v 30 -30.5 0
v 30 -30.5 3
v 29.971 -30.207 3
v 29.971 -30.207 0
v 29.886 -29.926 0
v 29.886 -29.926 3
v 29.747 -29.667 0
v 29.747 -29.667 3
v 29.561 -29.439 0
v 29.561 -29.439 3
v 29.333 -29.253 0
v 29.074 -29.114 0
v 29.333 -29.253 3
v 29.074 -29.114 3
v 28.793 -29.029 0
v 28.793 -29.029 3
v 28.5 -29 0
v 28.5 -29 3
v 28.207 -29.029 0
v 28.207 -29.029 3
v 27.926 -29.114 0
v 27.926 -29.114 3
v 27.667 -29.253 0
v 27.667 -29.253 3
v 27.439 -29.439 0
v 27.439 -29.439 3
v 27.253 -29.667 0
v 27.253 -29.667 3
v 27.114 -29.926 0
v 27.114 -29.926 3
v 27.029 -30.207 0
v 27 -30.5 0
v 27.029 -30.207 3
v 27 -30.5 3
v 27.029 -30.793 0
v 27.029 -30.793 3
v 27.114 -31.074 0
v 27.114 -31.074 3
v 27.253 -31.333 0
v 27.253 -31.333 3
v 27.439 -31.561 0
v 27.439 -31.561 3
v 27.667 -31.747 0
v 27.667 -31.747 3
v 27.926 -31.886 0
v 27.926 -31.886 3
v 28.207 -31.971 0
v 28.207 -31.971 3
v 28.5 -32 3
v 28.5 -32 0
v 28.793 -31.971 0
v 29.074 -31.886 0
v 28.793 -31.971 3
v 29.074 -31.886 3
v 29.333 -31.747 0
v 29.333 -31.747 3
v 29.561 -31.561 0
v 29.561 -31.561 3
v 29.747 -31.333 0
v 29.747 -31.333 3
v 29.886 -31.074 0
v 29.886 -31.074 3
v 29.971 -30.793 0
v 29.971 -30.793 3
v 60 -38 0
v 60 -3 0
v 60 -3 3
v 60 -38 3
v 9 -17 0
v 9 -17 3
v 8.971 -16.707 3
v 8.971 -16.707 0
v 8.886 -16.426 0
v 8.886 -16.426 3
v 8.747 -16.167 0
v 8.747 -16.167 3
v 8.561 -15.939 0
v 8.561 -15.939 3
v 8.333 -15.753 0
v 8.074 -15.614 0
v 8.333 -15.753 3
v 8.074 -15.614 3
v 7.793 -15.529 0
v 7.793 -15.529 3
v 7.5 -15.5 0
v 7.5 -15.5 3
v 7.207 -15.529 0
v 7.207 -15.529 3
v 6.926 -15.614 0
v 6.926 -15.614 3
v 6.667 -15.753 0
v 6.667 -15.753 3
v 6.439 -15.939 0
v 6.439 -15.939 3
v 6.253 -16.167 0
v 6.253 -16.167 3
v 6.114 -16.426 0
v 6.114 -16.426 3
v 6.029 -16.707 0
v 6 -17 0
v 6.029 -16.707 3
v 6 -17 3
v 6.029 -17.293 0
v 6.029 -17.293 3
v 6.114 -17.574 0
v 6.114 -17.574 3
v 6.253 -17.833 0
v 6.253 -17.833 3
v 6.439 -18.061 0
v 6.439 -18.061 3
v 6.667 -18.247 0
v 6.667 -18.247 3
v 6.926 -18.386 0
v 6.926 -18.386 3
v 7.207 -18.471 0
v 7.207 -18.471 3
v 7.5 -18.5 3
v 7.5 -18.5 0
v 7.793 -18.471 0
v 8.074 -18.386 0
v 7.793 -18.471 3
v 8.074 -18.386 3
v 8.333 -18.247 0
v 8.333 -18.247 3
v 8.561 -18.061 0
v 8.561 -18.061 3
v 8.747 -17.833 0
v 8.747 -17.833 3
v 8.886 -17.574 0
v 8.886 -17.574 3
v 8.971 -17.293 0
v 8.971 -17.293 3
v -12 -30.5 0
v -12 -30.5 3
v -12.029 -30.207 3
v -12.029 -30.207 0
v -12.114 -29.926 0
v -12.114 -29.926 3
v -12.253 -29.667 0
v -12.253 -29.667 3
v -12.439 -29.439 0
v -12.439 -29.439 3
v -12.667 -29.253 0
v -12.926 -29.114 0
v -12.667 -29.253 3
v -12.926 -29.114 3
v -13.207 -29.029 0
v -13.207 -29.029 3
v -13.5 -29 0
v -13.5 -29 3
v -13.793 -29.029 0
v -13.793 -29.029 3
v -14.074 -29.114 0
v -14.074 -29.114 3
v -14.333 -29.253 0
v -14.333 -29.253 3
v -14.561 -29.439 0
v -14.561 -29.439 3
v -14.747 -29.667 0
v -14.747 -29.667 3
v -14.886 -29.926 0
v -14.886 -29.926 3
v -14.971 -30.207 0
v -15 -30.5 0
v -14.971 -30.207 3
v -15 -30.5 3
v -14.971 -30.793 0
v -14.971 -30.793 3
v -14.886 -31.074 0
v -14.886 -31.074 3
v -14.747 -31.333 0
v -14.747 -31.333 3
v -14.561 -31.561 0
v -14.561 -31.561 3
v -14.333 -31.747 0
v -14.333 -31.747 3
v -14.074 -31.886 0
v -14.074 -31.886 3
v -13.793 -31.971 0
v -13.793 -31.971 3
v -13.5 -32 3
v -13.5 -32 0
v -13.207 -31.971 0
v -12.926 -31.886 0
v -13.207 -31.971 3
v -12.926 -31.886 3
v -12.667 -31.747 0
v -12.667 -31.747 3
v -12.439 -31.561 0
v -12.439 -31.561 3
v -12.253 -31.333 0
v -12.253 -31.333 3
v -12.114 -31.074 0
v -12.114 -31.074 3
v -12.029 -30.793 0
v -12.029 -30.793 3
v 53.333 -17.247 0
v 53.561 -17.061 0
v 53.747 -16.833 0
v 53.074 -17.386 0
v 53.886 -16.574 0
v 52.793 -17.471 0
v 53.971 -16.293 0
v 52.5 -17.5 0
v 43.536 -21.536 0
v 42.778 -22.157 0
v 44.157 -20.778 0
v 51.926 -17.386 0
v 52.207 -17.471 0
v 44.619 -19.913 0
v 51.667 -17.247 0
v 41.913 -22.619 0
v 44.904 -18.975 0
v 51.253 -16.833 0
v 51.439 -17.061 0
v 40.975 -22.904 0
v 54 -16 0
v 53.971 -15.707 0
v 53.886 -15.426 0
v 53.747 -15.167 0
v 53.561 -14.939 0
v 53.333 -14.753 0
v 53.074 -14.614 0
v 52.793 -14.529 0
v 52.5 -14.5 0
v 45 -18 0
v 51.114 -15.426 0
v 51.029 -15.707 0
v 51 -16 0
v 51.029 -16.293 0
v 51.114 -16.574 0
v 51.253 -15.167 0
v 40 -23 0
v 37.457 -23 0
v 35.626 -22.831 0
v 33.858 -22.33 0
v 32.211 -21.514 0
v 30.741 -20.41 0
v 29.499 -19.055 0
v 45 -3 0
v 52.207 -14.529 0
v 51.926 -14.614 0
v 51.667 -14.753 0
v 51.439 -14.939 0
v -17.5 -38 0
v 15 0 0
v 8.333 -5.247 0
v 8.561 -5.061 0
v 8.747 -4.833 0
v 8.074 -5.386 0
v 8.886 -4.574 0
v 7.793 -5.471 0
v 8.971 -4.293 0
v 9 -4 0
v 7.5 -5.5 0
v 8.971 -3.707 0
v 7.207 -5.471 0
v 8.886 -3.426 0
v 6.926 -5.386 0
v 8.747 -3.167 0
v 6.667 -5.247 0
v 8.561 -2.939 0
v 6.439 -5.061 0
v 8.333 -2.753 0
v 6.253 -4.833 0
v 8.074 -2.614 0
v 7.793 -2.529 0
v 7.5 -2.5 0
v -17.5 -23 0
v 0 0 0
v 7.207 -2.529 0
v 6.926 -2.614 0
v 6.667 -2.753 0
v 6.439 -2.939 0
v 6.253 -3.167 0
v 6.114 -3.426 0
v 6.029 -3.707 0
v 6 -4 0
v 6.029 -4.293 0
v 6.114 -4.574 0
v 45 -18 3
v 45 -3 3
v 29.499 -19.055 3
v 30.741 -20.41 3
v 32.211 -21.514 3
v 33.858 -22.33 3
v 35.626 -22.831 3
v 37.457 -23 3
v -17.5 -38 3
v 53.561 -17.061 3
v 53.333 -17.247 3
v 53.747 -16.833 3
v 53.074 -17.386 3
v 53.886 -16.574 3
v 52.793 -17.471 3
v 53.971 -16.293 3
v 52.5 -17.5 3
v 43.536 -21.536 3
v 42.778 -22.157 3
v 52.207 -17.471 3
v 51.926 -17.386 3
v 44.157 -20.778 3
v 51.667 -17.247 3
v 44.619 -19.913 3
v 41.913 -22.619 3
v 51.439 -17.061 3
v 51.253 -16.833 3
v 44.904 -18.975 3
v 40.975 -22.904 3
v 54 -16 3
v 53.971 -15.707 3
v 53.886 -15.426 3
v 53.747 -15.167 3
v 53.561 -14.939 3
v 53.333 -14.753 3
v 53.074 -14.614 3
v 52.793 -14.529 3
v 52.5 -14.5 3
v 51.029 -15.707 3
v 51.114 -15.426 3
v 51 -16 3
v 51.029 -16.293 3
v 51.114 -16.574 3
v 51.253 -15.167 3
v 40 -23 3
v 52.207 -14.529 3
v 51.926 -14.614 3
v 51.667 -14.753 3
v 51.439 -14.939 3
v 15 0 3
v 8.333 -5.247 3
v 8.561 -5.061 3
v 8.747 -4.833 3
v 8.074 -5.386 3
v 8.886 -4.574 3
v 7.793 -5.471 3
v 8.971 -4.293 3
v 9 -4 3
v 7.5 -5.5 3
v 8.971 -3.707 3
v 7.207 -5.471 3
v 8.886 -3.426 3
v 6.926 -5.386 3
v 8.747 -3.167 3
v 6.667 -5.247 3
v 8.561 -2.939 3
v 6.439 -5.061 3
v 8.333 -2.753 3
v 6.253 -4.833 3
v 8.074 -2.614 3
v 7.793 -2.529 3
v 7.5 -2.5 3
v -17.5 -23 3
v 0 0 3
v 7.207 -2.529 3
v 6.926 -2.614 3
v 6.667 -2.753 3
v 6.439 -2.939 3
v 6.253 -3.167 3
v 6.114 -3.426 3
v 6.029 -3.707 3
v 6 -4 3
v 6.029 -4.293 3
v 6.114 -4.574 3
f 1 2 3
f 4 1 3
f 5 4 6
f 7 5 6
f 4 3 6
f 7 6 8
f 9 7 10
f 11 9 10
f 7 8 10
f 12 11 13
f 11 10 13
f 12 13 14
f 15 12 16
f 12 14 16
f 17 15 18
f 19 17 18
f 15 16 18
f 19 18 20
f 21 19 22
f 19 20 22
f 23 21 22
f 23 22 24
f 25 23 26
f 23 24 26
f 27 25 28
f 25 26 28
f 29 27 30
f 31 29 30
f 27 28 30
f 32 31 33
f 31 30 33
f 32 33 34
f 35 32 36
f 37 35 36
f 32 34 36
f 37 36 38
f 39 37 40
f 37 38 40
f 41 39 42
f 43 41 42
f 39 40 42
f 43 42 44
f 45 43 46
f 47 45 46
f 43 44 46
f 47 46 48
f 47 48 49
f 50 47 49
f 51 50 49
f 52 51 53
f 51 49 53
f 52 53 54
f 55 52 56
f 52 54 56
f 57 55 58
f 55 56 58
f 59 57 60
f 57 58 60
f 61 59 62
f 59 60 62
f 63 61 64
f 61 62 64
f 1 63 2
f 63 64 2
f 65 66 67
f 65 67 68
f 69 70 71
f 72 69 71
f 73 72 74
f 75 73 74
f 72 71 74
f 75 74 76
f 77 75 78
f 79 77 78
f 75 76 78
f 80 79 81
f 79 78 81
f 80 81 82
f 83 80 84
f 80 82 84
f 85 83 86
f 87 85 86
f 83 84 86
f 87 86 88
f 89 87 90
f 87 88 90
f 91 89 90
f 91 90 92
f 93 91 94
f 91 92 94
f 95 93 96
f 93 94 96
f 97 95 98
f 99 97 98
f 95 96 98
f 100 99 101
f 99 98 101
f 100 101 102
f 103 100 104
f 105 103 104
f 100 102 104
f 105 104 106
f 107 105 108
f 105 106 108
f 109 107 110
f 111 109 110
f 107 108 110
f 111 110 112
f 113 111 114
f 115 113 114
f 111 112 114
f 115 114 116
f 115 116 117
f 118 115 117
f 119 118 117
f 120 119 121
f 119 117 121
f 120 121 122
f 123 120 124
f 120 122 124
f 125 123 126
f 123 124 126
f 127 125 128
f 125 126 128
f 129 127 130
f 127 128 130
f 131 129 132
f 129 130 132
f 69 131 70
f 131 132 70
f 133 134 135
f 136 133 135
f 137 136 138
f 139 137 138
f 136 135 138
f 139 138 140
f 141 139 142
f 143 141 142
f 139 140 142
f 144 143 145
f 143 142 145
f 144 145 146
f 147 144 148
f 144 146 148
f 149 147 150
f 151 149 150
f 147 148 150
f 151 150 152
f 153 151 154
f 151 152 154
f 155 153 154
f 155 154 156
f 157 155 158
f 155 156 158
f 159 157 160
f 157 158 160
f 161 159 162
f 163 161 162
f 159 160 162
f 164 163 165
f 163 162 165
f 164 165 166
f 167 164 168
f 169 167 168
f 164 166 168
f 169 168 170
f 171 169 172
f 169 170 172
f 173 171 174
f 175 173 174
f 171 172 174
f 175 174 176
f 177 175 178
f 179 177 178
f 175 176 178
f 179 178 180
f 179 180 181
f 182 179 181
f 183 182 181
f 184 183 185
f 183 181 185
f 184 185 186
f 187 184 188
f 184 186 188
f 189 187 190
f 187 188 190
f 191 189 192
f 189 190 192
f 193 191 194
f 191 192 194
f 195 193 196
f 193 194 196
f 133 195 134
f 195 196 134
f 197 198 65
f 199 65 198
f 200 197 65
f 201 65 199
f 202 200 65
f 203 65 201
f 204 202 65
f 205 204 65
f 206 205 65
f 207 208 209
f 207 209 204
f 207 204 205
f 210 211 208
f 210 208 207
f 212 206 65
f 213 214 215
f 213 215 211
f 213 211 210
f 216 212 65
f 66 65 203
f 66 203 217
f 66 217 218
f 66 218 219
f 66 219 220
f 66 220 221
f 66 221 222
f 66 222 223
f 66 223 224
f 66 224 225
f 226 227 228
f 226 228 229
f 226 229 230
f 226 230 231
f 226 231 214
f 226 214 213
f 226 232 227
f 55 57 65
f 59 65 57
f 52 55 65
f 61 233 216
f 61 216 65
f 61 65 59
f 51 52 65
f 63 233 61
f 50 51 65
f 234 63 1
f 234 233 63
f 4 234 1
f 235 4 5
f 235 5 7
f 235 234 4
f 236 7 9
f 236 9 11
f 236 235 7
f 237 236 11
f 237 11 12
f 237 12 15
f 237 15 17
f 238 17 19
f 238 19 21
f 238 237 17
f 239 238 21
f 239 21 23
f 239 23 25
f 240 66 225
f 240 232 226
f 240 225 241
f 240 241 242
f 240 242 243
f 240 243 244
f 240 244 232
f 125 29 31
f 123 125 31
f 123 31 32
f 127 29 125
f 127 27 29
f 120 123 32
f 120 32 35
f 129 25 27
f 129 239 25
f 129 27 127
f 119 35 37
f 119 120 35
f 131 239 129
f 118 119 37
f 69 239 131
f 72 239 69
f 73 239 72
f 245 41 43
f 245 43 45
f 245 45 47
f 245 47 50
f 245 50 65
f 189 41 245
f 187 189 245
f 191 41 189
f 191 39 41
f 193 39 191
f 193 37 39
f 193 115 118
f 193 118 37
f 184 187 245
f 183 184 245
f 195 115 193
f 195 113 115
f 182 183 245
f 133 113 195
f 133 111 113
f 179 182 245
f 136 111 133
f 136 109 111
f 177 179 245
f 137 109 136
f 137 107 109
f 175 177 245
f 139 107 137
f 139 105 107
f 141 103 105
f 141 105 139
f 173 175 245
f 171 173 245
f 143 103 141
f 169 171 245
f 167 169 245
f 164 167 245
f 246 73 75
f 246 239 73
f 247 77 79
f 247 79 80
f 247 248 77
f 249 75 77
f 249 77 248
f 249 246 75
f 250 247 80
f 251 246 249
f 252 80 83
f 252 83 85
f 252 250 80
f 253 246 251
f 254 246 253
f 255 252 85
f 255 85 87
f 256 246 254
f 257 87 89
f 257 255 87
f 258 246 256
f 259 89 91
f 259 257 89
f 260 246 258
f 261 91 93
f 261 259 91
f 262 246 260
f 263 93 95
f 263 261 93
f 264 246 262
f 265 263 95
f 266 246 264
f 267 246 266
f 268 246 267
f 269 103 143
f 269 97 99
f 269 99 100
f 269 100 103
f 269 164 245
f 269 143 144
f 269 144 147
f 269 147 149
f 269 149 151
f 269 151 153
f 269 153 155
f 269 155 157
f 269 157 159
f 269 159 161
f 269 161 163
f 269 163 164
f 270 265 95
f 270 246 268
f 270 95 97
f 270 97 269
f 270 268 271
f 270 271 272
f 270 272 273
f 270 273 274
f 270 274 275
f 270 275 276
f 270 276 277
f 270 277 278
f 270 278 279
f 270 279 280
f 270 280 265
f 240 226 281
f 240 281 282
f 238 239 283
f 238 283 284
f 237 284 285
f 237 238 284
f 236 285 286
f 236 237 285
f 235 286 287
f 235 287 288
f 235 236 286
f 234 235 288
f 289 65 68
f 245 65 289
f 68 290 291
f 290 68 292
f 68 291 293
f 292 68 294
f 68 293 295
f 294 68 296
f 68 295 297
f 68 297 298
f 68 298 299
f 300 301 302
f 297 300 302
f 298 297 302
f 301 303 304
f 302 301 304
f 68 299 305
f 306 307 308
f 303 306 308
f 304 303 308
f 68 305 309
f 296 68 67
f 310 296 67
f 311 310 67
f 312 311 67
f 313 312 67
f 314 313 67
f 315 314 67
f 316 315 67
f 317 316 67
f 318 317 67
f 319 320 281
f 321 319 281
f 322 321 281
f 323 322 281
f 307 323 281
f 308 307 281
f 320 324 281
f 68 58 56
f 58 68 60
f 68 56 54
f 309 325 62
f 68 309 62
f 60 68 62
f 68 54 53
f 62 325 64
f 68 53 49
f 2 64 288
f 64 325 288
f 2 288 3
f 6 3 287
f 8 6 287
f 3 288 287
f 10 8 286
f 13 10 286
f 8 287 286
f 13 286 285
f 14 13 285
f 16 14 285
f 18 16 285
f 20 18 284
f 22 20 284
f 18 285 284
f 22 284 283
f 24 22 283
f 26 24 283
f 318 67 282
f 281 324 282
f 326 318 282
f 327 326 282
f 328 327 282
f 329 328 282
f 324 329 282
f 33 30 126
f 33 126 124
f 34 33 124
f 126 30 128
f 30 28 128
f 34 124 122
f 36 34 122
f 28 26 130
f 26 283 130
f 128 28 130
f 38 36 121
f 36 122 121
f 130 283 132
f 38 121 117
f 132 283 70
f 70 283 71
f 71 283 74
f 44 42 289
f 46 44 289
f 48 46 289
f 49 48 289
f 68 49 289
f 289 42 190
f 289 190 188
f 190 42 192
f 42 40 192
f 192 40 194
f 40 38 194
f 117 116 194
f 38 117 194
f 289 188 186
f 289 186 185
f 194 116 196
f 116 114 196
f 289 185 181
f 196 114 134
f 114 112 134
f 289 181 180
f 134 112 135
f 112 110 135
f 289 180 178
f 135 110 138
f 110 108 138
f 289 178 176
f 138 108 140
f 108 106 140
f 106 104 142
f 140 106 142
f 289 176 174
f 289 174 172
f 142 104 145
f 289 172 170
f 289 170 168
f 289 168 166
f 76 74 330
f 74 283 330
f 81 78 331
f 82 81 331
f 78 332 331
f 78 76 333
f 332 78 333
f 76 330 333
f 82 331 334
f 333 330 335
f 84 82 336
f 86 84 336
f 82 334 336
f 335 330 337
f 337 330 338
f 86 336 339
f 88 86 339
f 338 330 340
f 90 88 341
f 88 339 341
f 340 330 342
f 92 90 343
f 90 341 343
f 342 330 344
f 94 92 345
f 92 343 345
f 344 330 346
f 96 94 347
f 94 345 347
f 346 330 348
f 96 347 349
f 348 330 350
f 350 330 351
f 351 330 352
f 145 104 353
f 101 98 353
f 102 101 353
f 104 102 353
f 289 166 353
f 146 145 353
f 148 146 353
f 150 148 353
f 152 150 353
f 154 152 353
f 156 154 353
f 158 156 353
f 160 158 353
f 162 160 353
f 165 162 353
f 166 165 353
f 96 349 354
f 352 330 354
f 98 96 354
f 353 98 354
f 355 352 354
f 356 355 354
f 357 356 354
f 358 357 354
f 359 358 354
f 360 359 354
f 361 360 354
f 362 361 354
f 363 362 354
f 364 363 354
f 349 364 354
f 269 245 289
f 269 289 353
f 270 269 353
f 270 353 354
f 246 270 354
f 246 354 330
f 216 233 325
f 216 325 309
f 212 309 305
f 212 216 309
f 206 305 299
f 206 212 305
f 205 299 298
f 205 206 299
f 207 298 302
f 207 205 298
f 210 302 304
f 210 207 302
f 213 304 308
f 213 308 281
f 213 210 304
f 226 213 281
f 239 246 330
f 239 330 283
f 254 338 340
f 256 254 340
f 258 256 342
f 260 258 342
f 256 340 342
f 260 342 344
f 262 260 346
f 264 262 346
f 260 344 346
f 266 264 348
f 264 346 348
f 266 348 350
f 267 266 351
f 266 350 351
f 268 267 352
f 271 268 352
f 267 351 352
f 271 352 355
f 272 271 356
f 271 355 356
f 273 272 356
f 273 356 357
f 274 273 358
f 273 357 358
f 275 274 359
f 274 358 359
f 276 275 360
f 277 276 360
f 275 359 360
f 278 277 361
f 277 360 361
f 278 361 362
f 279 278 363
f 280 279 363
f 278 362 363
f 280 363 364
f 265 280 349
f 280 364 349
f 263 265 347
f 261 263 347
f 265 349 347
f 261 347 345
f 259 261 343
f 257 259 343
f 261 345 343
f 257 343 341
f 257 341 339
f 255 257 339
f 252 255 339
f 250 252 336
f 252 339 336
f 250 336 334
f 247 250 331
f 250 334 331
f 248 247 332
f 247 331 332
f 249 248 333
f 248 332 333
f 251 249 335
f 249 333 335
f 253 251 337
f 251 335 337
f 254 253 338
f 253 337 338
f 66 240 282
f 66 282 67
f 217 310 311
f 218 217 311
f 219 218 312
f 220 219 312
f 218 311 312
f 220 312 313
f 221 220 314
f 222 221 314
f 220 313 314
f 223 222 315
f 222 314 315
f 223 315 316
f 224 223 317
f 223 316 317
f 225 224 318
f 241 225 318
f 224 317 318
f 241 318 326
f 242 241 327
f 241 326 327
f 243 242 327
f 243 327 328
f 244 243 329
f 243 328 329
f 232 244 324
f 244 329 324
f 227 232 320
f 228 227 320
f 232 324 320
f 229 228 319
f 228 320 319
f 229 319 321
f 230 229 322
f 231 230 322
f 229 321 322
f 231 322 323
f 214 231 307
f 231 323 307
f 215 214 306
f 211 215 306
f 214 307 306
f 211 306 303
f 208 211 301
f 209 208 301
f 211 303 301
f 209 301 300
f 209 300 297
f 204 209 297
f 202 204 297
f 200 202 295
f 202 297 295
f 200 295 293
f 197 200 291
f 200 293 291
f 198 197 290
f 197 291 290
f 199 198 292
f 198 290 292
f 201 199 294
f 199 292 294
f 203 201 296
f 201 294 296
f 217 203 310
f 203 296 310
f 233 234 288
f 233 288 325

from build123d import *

# Parameters (mm, degrees)
EXTRUDE_1_DEPTH     = 3
SKETCH_2_R          = 1.5
CUT_EXTRUDE_1_DEPTH = 3


with BuildPart() as part:
    # 草图1 → 凸台-拉伸1 (new body)
    with BuildSketch(Plane.XY):
        with BuildLine():
            Line((0, 0), (15, 0))
            Line((15, 0), (29.498535682, -19.055218325))
            ThreePointArc((29.498535682, -19.055218325), (33.015661922, -21.959692608), (37.456822623, -23))
            Line((37.456822623, -23), (40, -23))
            ThreePointArc((40, -23), (43.535533906, -21.535533906), (45, -18))
            Line((45, -18), (45, -3))
            Line((45, -3), (60, -3))
            Line((60, -3), (60, -38))
            Line((60, -38), (-17.5, -38))
            Line((-17.5, -38), (-17.5, -23))
            Line((-17.5, -23), (0, 0))
        make_face()
    extrude(amount=EXTRUDE_1_DEPTH)

    # 草图2 → 切除-拉伸1 (cut)
    with BuildSketch(Plane.XY.offset(3)):
        with Locations((-13.5, -30.5)):
            Circle(SKETCH_2_R)
        with Locations((28.5, -30.5)):
            Circle(SKETCH_2_R)
        with Locations((7.5, -4)):
            Circle(SKETCH_2_R)
        with Locations((7.5, -17)):
            Circle(SKETCH_2_R)
        with Locations((52.5, -16)):
            Circle(SKETCH_2_R)
    extrude(amount=-CUT_EXTRUDE_1_DEPTH, mode=Mode.SUBTRACT)


solid = part.part
